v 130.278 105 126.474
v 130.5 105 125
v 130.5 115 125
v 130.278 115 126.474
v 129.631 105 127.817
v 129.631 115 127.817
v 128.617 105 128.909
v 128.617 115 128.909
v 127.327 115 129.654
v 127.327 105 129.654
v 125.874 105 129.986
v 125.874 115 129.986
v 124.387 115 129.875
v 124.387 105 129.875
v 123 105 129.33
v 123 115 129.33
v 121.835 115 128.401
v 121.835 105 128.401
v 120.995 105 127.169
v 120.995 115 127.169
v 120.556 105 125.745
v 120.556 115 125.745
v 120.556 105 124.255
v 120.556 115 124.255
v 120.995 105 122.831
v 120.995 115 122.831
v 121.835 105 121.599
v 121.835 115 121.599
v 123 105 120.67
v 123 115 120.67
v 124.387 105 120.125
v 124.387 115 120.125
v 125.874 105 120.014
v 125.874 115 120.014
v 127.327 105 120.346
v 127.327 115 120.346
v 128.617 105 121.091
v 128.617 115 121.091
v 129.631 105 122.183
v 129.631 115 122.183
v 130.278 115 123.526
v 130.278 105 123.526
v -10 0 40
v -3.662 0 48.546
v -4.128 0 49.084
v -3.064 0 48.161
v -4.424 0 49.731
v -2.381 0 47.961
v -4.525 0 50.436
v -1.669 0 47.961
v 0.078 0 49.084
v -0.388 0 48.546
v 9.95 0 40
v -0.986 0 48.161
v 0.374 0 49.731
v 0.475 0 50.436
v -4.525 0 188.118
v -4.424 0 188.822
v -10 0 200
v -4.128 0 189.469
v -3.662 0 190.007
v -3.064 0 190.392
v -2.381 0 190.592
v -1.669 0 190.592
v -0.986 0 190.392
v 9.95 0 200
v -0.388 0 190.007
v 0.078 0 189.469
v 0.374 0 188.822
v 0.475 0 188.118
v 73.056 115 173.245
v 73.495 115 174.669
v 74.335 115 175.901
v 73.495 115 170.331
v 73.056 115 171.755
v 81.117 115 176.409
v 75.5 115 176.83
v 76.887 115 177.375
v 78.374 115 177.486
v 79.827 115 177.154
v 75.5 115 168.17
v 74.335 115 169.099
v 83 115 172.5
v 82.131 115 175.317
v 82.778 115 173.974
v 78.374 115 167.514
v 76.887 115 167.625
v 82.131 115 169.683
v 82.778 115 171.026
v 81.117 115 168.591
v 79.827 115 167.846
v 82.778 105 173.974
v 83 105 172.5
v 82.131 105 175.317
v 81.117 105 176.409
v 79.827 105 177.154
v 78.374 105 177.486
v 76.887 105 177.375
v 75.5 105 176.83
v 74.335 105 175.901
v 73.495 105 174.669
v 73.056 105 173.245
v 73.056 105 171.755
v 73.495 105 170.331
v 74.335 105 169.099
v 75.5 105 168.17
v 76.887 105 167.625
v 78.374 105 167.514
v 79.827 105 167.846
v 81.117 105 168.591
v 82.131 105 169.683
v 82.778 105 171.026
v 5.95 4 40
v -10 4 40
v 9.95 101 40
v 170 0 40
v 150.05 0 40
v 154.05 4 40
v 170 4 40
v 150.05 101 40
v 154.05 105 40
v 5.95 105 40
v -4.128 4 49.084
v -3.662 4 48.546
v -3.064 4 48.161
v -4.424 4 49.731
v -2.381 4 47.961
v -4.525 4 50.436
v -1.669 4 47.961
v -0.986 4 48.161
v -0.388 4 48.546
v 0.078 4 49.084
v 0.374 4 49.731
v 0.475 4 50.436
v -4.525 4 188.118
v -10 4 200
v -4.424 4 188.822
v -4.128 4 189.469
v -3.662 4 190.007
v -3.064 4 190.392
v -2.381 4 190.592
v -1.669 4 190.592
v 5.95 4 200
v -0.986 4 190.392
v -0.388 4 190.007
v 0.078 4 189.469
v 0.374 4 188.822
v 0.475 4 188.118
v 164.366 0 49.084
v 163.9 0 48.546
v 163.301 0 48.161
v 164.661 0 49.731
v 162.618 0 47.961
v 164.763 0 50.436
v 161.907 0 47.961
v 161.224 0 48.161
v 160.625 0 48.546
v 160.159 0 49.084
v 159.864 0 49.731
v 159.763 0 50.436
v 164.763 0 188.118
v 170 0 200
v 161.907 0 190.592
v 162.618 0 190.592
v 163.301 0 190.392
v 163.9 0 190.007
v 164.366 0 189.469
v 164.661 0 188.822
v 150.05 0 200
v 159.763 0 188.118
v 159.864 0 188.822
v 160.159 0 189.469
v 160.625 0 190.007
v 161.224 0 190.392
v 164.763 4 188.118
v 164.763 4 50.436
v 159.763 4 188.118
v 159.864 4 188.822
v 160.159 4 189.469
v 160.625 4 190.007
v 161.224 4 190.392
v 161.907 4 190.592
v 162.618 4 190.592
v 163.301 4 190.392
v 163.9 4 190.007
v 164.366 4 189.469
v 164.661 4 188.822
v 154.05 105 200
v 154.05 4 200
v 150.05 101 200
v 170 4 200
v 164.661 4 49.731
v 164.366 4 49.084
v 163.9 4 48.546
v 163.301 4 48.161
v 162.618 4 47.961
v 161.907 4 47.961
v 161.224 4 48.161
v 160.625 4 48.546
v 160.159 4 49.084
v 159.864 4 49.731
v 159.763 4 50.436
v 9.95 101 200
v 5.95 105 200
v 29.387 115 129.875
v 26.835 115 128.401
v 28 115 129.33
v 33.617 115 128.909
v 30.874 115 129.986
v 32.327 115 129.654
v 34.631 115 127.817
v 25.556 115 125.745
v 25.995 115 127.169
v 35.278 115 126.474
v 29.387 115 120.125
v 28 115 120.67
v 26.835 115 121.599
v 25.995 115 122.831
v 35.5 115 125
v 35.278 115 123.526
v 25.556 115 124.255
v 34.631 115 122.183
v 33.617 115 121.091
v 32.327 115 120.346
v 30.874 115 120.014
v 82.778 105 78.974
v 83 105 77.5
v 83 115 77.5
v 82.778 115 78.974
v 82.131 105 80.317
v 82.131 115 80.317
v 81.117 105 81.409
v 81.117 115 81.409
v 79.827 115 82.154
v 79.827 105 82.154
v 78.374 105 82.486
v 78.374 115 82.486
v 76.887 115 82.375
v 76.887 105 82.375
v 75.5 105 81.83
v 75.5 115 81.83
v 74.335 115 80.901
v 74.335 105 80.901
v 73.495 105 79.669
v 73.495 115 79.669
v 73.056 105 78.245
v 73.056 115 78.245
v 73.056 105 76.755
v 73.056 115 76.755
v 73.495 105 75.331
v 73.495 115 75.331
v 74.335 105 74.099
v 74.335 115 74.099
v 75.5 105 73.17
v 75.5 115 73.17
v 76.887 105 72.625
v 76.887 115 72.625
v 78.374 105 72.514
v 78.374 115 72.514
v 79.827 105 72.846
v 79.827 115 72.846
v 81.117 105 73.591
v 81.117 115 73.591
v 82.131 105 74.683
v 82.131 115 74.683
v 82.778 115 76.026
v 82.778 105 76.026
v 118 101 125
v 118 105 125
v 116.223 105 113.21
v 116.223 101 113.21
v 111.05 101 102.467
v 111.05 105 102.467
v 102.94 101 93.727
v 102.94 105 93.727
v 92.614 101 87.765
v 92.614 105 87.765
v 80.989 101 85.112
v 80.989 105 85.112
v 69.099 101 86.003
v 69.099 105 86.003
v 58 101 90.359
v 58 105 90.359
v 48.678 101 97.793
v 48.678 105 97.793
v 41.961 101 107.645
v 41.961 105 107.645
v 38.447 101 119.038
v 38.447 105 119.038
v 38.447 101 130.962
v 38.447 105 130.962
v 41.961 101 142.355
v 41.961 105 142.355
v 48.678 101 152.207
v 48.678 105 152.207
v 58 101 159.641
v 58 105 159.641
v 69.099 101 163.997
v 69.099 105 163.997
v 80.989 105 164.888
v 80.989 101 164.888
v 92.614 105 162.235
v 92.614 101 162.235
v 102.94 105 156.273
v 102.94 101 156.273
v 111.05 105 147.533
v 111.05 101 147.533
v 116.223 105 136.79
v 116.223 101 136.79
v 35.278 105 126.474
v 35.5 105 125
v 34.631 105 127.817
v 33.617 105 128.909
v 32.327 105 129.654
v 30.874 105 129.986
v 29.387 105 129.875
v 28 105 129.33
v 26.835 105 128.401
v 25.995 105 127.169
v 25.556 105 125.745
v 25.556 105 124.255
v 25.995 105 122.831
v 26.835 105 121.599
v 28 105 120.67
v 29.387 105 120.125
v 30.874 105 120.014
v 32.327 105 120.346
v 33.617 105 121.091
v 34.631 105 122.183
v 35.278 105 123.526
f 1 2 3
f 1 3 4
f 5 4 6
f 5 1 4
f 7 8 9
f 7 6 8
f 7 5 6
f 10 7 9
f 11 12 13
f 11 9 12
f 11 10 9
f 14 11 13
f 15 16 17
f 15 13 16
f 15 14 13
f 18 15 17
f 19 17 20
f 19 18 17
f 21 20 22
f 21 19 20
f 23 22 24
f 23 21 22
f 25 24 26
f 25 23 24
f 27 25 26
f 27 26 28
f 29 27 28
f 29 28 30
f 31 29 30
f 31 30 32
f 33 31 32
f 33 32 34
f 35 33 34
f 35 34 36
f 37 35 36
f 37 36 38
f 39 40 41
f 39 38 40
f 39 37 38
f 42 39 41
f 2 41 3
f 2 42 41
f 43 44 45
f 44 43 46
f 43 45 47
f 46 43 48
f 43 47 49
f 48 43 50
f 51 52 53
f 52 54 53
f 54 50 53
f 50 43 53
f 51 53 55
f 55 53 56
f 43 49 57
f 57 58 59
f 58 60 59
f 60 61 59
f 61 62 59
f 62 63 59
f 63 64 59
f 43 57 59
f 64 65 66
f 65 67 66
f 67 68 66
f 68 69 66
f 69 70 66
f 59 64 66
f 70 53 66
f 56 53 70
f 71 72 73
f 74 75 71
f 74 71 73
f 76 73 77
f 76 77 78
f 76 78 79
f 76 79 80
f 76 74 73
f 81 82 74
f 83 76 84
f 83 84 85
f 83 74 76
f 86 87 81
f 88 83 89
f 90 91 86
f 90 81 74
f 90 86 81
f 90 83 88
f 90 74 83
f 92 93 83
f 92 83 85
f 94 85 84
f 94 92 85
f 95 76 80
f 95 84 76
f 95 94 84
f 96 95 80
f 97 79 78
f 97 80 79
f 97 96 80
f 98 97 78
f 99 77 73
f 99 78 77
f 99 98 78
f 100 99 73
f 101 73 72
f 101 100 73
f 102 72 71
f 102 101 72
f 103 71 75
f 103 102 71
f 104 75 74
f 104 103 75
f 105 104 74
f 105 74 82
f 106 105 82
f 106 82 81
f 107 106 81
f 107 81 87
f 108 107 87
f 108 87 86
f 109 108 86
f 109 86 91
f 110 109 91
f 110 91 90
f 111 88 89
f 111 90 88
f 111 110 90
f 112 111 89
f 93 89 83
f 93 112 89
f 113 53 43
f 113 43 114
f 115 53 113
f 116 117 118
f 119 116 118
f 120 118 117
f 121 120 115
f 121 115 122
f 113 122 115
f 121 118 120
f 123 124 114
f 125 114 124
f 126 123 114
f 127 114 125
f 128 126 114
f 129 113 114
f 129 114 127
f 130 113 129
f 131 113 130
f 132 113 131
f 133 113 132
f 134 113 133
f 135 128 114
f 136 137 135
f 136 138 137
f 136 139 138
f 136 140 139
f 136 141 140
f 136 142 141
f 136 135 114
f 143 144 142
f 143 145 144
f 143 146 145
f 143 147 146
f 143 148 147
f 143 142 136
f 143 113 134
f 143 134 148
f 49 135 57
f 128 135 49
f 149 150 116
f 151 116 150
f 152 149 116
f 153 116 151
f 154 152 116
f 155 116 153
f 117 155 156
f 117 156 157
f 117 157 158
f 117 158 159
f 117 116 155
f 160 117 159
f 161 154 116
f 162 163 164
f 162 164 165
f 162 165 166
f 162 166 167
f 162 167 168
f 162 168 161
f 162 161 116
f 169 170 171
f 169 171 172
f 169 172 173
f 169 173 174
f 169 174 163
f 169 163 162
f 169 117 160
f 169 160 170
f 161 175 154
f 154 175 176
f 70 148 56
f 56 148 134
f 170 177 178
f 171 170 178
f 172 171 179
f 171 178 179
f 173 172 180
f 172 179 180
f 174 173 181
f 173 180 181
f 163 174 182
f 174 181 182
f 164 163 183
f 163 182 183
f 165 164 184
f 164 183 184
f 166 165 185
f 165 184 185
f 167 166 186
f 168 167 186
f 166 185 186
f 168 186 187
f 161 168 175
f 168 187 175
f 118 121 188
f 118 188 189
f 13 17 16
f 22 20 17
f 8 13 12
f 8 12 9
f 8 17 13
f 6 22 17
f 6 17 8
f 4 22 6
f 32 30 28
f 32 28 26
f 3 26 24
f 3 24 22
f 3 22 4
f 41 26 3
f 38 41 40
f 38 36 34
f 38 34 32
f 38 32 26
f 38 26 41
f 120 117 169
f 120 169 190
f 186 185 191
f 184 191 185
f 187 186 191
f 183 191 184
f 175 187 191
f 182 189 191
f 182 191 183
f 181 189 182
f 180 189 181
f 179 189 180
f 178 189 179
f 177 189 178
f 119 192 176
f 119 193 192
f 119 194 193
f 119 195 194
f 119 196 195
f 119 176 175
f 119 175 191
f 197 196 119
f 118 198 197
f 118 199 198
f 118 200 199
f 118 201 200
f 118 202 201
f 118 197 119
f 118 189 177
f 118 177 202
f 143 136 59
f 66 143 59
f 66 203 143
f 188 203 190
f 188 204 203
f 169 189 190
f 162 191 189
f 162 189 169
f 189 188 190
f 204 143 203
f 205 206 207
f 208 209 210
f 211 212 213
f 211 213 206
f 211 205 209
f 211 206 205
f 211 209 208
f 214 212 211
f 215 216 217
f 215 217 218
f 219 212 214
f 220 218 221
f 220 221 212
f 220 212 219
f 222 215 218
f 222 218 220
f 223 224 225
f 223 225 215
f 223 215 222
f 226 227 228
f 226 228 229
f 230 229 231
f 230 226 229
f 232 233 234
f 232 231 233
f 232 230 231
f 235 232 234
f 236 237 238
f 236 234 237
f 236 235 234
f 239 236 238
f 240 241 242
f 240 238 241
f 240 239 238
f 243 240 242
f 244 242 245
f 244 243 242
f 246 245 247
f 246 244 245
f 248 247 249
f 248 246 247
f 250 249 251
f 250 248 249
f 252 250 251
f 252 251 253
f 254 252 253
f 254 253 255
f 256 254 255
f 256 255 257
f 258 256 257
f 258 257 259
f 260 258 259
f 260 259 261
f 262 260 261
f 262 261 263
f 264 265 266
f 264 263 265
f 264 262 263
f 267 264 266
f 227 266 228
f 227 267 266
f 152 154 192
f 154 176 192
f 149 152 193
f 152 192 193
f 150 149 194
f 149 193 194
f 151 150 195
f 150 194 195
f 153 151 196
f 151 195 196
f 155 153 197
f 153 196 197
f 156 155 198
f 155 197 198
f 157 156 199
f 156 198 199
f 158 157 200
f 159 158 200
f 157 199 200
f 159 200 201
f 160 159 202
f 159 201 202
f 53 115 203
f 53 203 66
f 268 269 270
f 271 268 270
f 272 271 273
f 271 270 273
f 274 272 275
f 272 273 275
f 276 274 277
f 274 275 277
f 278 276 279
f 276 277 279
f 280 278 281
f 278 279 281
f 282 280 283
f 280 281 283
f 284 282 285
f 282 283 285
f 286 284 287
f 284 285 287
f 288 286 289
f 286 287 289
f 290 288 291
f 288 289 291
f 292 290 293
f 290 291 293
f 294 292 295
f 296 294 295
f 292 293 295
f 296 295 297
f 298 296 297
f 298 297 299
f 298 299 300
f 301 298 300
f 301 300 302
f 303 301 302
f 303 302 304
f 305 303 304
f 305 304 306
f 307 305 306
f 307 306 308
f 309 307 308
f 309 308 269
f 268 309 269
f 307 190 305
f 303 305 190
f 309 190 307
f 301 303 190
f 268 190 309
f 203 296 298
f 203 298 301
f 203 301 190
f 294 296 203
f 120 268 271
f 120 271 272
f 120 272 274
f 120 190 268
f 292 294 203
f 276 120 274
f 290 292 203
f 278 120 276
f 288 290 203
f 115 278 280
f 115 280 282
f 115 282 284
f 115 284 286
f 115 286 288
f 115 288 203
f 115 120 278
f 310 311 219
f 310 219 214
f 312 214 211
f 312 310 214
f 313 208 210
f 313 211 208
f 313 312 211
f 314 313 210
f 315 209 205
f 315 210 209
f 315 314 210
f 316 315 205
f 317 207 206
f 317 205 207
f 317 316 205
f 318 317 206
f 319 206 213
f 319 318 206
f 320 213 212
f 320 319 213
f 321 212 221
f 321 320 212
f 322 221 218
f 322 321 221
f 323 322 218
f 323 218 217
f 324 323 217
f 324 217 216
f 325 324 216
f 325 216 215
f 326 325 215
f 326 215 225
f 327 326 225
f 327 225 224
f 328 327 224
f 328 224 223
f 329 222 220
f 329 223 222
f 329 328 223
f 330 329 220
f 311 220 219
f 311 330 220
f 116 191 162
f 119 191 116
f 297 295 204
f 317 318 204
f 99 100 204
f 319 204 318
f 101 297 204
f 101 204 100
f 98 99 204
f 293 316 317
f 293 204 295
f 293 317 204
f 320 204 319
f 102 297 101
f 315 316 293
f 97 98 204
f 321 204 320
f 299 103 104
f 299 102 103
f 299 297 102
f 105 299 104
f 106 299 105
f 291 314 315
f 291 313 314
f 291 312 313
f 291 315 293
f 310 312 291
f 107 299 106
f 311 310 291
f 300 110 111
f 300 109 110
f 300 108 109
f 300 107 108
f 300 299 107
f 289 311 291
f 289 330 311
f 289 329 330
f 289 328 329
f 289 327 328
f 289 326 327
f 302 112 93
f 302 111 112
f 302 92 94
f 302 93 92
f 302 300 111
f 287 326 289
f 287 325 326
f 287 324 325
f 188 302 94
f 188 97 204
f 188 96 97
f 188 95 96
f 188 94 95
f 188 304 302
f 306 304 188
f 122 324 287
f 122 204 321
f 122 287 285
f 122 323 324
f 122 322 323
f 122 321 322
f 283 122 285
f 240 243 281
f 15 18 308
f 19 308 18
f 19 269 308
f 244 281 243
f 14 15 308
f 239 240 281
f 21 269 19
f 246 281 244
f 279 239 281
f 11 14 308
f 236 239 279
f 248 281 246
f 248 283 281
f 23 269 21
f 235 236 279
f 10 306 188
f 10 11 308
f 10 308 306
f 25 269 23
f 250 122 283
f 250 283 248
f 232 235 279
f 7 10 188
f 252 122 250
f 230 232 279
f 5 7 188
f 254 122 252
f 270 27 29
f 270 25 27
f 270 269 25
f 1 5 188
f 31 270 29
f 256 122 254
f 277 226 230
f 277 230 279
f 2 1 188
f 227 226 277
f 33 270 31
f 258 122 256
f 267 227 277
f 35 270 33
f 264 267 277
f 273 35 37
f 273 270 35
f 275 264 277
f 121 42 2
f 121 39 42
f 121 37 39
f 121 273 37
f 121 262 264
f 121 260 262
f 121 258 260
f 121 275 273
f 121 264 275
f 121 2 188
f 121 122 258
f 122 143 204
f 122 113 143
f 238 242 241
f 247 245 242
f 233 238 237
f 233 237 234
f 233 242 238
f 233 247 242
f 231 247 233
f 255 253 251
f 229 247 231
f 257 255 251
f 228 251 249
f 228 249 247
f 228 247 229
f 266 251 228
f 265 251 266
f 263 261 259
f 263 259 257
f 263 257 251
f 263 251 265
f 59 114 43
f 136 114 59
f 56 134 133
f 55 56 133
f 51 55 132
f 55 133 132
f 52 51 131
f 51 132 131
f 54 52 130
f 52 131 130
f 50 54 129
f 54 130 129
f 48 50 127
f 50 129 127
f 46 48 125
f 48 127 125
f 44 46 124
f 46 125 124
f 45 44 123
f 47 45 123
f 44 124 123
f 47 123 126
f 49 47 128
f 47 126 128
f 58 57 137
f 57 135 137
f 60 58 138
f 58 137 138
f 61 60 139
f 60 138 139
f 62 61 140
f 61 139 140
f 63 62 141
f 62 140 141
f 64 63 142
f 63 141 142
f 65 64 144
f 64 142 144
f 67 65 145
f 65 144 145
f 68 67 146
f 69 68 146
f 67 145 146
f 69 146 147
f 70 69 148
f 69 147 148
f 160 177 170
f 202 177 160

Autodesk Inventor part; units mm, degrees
ref_plane "YZ Plane" through (0, 0, 0) normal (1, 0, 0) x (0, 1, 0)
ref_plane "XZ Plane" through (0, 0, 0) normal (0, 1, 0) x (-1, 0, 0)
ref_plane "XY Plane" through (0, 0, 0) normal (0, 0, 1) x (1, 0, 0)
sketch "Sketch1" plane through (0, 0, 0) normal (0, 1, 0) x (-1, 0, 0)
  point P0 (0, 0)
sketch "Sketch2" plane through (0, 0, 0) normal (0, 0, 1) x (1, 0, 0)
  line L0 (0, 0) -> (0, 4)
  line L1 (160, 0) -> (160, 4)
  line L2 (0, 0) -> (9.95, 0)
  line L3 (160, 0) -> (150.05, 0)
  line L4 (150.05, 0) -> (150.05, 101)
  line L5 (150.05, 101) -> (9.95, 101)
  line L6 (9.95, 101) -> (9.95, 0)
  line L7 (0, 4) -> (5.95, 4)
  line L8 (5.95, 4) -> (5.95, 101)
  line L9 (5.95, 101) -> (5.95, 105)
  line L10 (5.95, 105) -> (150.05, 105)
  line L11 (150.05, 105) -> (154.05, 105)
  line L12 (154.05, 105) -> (154.05, 4)
  line L13 (154.05, 4) -> (160, 4)
  line L14 (0, 0) -> (9.95, 0)
  line L15 (150.05, 0) -> (160, 0)
extrude "Extrusion1" add sketch "Sketch2" along normal blind 250
sketch "Sketch3" plane through (5.95, 105, 0) normal (0, 1, 0) x (1, 0, 0)
  line L0 (0, 0) -> (0, -250) projected
  line L1 (144.1, 0) -> (144.1, -250) projected
  circle A0 centre (72.05, -125) radius 40
  point P0 (-5.95, 0)
  dimension "d15" = 80
extrude "Extrusion2" cut sketch "Sketch3" against normal blind 250
sketch "Sketch4" plane through (0, 0, 250) normal (0, 0, 1) x (1, 0, 0)
  point P0 (0, 0)
sketch "Sketch5" plane through (0, 0, 250) normal (0, 0, 1) x (1, 0, 0)
  line L0 (0, 0) -> (165.9252, 0)
  line L1 (165.9252, 0) -> (165.9252, 113.7831)
  line L2 (165.9252, 113.7831) -> (0, 113.7831)
  line L3 (0, 113.7831) -> (0, 0)
extrude "Extrusion3" cut sketch "Sketch5" against normal blind 50
sketch "Sketch6" plane through (0, 0, 0) normal (0, 0, -1) x (-1, 0, 0)
  line L0 (0, 4) -> (0, 0) projected
  line L1 (0, 0) -> (-198.2615, 0)
  line L2 (-198.2615, 0) -> (-198.2615, 123.0797)
  line L3 (-198.2615, 123.0797) -> (0, 123.0797)
  line L4 (0, 123.0797) -> (0, 0)
extrude "Extrusion4" cut sketch "Sketch6" against normal blind 40
sketch "Sketch7" plane through (160, 0, 200) normal (1, 0, 0) x (0, 0, -1)
  line L0 (0, 0) -> (0, 4) projected
  line L1 (160, 0) -> (0, 0) projected
  line L2 (0, 4) -> (160, 4)
  line L3 (160, 4) -> (160, 0)
  line L4 (160, 0) -> (0, 0)
  line L5 (0, 0) -> (0, 4)
  point P0 (200, 0)
extrude "Extrusion5" add sketch "Sketch7" along normal blind 10
sketch "Sketch8" plane through (0, 0, 200) normal (-1, 0, 0) x (0, 0, 1)
  line L0 (-160, 0) -> (0, 0) projected
  line L1 (-160, 4) -> (0, 4)
  line L2 (0, 4) -> (0, 0)
  line L3 (0, 0) -> (-160, 0)
  line L4 (-160, 0) -> (-160, 4)
  point P0 (-200, 0)
extrude "Extrusion6" add sketch "Sketch8" along normal blind 10
sketch "Sketch9" plane through (5.95, 4, 200) normal (0, 1, 0) x (1, 0, 0)
  line L0 (0, 160) -> (0, 0) projected
  line L1 (0, 0) -> (-15.95, 0) projected
  arc A0 (-5.475, 149.5645) -> (-10.475, 149.5645) centre (-7.975, 149.5645) ccw
  arc A1 (-10.475, 11.8823) -> (-5.475, 11.8823) centre (-7.975, 11.8823) ccw
  line L2 (-10.475, 11.8823) -> (-10.475, 149.5645)
  line L3 (-5.475, 11.8823) -> (-5.475, 149.5645)
  line L4 (164.05, 0) -> (164.05, 160) projected
  line L5 (164.05, 0) -> (148.5752, 0)
  line L6 (164.05, 0) -> (144.1, 0) projected
  line L7 (144.1, 160) -> (164.05, 160) projected
  arc A2 (153.8126, 11.8823) -> (158.8126, 11.8823) centre (156.3126, 11.8823) ccw
  arc A3 (158.8126, 149.5645) -> (153.8126, 149.5645) centre (156.3126, 149.5645) ccw
  line L8 (153.8126, 11.8823) -> (153.8126, 149.5645)
  line L9 (158.8126, 11.8823) -> (158.8126, 149.5645)
  point P0 (-5.95, 200)
  point P1 (-15.95, 160)
  dimension "d26" = 5
  dimension "d27" = 5
  dimension "d28" = 5
  dimension "d29" = 5
extrude "Extrusion7" cut sketch "Sketch9" against normal blind 10
sketch "Sketch10" plane through (5.95, 105, 200) normal (0, 1, 0) x (1, 0, 0)
  circle A0 centre (72.05, 75) radius 40 projected
  line L0 (0, 0) -> (148.1, 0) projected
  line L1 (4, 160) -> (4, 0) projected
  line L2 (144.1, 160) -> (144.1, 0) projected
  circle A1 centre (119.55, 75) radius 5
  circle A2 centre (72.05, 27.5) radius 5
  circle A3 centre (24.55, 75) radius 5
  circle A4 centre (72.05, 122.5) radius 5
  point P0 (-5.95, 200)
  dimension "d35" = 10
  dimension "d39" = 10
  dimension "d40" = 10
  dimension "d41" = 10
extrude "Extrusion8" add sketch "Sketch10" along normal blind 10 contours A1 | A2 | A3 | A4
equation "\"BendRadius\" = Thickness"
equation "\"BendReliefWidth\" = Thickness"
equation "\"BendReliefDepth\" = 0.5 * Thickness"
equation "\"CornerReliefSize\" = 4 * Thickness"
equation "\"MinimumRemnant\" = 2 * Thickness"
equation "\"TransitionRadius\" = BendRadius"
equation "\"JacobiRadiusSize\" = BendRadius"
equation "\"GapSize\" = Thickness"
equation "\"Thickness\" = 0.5"
properties part number "caja"
